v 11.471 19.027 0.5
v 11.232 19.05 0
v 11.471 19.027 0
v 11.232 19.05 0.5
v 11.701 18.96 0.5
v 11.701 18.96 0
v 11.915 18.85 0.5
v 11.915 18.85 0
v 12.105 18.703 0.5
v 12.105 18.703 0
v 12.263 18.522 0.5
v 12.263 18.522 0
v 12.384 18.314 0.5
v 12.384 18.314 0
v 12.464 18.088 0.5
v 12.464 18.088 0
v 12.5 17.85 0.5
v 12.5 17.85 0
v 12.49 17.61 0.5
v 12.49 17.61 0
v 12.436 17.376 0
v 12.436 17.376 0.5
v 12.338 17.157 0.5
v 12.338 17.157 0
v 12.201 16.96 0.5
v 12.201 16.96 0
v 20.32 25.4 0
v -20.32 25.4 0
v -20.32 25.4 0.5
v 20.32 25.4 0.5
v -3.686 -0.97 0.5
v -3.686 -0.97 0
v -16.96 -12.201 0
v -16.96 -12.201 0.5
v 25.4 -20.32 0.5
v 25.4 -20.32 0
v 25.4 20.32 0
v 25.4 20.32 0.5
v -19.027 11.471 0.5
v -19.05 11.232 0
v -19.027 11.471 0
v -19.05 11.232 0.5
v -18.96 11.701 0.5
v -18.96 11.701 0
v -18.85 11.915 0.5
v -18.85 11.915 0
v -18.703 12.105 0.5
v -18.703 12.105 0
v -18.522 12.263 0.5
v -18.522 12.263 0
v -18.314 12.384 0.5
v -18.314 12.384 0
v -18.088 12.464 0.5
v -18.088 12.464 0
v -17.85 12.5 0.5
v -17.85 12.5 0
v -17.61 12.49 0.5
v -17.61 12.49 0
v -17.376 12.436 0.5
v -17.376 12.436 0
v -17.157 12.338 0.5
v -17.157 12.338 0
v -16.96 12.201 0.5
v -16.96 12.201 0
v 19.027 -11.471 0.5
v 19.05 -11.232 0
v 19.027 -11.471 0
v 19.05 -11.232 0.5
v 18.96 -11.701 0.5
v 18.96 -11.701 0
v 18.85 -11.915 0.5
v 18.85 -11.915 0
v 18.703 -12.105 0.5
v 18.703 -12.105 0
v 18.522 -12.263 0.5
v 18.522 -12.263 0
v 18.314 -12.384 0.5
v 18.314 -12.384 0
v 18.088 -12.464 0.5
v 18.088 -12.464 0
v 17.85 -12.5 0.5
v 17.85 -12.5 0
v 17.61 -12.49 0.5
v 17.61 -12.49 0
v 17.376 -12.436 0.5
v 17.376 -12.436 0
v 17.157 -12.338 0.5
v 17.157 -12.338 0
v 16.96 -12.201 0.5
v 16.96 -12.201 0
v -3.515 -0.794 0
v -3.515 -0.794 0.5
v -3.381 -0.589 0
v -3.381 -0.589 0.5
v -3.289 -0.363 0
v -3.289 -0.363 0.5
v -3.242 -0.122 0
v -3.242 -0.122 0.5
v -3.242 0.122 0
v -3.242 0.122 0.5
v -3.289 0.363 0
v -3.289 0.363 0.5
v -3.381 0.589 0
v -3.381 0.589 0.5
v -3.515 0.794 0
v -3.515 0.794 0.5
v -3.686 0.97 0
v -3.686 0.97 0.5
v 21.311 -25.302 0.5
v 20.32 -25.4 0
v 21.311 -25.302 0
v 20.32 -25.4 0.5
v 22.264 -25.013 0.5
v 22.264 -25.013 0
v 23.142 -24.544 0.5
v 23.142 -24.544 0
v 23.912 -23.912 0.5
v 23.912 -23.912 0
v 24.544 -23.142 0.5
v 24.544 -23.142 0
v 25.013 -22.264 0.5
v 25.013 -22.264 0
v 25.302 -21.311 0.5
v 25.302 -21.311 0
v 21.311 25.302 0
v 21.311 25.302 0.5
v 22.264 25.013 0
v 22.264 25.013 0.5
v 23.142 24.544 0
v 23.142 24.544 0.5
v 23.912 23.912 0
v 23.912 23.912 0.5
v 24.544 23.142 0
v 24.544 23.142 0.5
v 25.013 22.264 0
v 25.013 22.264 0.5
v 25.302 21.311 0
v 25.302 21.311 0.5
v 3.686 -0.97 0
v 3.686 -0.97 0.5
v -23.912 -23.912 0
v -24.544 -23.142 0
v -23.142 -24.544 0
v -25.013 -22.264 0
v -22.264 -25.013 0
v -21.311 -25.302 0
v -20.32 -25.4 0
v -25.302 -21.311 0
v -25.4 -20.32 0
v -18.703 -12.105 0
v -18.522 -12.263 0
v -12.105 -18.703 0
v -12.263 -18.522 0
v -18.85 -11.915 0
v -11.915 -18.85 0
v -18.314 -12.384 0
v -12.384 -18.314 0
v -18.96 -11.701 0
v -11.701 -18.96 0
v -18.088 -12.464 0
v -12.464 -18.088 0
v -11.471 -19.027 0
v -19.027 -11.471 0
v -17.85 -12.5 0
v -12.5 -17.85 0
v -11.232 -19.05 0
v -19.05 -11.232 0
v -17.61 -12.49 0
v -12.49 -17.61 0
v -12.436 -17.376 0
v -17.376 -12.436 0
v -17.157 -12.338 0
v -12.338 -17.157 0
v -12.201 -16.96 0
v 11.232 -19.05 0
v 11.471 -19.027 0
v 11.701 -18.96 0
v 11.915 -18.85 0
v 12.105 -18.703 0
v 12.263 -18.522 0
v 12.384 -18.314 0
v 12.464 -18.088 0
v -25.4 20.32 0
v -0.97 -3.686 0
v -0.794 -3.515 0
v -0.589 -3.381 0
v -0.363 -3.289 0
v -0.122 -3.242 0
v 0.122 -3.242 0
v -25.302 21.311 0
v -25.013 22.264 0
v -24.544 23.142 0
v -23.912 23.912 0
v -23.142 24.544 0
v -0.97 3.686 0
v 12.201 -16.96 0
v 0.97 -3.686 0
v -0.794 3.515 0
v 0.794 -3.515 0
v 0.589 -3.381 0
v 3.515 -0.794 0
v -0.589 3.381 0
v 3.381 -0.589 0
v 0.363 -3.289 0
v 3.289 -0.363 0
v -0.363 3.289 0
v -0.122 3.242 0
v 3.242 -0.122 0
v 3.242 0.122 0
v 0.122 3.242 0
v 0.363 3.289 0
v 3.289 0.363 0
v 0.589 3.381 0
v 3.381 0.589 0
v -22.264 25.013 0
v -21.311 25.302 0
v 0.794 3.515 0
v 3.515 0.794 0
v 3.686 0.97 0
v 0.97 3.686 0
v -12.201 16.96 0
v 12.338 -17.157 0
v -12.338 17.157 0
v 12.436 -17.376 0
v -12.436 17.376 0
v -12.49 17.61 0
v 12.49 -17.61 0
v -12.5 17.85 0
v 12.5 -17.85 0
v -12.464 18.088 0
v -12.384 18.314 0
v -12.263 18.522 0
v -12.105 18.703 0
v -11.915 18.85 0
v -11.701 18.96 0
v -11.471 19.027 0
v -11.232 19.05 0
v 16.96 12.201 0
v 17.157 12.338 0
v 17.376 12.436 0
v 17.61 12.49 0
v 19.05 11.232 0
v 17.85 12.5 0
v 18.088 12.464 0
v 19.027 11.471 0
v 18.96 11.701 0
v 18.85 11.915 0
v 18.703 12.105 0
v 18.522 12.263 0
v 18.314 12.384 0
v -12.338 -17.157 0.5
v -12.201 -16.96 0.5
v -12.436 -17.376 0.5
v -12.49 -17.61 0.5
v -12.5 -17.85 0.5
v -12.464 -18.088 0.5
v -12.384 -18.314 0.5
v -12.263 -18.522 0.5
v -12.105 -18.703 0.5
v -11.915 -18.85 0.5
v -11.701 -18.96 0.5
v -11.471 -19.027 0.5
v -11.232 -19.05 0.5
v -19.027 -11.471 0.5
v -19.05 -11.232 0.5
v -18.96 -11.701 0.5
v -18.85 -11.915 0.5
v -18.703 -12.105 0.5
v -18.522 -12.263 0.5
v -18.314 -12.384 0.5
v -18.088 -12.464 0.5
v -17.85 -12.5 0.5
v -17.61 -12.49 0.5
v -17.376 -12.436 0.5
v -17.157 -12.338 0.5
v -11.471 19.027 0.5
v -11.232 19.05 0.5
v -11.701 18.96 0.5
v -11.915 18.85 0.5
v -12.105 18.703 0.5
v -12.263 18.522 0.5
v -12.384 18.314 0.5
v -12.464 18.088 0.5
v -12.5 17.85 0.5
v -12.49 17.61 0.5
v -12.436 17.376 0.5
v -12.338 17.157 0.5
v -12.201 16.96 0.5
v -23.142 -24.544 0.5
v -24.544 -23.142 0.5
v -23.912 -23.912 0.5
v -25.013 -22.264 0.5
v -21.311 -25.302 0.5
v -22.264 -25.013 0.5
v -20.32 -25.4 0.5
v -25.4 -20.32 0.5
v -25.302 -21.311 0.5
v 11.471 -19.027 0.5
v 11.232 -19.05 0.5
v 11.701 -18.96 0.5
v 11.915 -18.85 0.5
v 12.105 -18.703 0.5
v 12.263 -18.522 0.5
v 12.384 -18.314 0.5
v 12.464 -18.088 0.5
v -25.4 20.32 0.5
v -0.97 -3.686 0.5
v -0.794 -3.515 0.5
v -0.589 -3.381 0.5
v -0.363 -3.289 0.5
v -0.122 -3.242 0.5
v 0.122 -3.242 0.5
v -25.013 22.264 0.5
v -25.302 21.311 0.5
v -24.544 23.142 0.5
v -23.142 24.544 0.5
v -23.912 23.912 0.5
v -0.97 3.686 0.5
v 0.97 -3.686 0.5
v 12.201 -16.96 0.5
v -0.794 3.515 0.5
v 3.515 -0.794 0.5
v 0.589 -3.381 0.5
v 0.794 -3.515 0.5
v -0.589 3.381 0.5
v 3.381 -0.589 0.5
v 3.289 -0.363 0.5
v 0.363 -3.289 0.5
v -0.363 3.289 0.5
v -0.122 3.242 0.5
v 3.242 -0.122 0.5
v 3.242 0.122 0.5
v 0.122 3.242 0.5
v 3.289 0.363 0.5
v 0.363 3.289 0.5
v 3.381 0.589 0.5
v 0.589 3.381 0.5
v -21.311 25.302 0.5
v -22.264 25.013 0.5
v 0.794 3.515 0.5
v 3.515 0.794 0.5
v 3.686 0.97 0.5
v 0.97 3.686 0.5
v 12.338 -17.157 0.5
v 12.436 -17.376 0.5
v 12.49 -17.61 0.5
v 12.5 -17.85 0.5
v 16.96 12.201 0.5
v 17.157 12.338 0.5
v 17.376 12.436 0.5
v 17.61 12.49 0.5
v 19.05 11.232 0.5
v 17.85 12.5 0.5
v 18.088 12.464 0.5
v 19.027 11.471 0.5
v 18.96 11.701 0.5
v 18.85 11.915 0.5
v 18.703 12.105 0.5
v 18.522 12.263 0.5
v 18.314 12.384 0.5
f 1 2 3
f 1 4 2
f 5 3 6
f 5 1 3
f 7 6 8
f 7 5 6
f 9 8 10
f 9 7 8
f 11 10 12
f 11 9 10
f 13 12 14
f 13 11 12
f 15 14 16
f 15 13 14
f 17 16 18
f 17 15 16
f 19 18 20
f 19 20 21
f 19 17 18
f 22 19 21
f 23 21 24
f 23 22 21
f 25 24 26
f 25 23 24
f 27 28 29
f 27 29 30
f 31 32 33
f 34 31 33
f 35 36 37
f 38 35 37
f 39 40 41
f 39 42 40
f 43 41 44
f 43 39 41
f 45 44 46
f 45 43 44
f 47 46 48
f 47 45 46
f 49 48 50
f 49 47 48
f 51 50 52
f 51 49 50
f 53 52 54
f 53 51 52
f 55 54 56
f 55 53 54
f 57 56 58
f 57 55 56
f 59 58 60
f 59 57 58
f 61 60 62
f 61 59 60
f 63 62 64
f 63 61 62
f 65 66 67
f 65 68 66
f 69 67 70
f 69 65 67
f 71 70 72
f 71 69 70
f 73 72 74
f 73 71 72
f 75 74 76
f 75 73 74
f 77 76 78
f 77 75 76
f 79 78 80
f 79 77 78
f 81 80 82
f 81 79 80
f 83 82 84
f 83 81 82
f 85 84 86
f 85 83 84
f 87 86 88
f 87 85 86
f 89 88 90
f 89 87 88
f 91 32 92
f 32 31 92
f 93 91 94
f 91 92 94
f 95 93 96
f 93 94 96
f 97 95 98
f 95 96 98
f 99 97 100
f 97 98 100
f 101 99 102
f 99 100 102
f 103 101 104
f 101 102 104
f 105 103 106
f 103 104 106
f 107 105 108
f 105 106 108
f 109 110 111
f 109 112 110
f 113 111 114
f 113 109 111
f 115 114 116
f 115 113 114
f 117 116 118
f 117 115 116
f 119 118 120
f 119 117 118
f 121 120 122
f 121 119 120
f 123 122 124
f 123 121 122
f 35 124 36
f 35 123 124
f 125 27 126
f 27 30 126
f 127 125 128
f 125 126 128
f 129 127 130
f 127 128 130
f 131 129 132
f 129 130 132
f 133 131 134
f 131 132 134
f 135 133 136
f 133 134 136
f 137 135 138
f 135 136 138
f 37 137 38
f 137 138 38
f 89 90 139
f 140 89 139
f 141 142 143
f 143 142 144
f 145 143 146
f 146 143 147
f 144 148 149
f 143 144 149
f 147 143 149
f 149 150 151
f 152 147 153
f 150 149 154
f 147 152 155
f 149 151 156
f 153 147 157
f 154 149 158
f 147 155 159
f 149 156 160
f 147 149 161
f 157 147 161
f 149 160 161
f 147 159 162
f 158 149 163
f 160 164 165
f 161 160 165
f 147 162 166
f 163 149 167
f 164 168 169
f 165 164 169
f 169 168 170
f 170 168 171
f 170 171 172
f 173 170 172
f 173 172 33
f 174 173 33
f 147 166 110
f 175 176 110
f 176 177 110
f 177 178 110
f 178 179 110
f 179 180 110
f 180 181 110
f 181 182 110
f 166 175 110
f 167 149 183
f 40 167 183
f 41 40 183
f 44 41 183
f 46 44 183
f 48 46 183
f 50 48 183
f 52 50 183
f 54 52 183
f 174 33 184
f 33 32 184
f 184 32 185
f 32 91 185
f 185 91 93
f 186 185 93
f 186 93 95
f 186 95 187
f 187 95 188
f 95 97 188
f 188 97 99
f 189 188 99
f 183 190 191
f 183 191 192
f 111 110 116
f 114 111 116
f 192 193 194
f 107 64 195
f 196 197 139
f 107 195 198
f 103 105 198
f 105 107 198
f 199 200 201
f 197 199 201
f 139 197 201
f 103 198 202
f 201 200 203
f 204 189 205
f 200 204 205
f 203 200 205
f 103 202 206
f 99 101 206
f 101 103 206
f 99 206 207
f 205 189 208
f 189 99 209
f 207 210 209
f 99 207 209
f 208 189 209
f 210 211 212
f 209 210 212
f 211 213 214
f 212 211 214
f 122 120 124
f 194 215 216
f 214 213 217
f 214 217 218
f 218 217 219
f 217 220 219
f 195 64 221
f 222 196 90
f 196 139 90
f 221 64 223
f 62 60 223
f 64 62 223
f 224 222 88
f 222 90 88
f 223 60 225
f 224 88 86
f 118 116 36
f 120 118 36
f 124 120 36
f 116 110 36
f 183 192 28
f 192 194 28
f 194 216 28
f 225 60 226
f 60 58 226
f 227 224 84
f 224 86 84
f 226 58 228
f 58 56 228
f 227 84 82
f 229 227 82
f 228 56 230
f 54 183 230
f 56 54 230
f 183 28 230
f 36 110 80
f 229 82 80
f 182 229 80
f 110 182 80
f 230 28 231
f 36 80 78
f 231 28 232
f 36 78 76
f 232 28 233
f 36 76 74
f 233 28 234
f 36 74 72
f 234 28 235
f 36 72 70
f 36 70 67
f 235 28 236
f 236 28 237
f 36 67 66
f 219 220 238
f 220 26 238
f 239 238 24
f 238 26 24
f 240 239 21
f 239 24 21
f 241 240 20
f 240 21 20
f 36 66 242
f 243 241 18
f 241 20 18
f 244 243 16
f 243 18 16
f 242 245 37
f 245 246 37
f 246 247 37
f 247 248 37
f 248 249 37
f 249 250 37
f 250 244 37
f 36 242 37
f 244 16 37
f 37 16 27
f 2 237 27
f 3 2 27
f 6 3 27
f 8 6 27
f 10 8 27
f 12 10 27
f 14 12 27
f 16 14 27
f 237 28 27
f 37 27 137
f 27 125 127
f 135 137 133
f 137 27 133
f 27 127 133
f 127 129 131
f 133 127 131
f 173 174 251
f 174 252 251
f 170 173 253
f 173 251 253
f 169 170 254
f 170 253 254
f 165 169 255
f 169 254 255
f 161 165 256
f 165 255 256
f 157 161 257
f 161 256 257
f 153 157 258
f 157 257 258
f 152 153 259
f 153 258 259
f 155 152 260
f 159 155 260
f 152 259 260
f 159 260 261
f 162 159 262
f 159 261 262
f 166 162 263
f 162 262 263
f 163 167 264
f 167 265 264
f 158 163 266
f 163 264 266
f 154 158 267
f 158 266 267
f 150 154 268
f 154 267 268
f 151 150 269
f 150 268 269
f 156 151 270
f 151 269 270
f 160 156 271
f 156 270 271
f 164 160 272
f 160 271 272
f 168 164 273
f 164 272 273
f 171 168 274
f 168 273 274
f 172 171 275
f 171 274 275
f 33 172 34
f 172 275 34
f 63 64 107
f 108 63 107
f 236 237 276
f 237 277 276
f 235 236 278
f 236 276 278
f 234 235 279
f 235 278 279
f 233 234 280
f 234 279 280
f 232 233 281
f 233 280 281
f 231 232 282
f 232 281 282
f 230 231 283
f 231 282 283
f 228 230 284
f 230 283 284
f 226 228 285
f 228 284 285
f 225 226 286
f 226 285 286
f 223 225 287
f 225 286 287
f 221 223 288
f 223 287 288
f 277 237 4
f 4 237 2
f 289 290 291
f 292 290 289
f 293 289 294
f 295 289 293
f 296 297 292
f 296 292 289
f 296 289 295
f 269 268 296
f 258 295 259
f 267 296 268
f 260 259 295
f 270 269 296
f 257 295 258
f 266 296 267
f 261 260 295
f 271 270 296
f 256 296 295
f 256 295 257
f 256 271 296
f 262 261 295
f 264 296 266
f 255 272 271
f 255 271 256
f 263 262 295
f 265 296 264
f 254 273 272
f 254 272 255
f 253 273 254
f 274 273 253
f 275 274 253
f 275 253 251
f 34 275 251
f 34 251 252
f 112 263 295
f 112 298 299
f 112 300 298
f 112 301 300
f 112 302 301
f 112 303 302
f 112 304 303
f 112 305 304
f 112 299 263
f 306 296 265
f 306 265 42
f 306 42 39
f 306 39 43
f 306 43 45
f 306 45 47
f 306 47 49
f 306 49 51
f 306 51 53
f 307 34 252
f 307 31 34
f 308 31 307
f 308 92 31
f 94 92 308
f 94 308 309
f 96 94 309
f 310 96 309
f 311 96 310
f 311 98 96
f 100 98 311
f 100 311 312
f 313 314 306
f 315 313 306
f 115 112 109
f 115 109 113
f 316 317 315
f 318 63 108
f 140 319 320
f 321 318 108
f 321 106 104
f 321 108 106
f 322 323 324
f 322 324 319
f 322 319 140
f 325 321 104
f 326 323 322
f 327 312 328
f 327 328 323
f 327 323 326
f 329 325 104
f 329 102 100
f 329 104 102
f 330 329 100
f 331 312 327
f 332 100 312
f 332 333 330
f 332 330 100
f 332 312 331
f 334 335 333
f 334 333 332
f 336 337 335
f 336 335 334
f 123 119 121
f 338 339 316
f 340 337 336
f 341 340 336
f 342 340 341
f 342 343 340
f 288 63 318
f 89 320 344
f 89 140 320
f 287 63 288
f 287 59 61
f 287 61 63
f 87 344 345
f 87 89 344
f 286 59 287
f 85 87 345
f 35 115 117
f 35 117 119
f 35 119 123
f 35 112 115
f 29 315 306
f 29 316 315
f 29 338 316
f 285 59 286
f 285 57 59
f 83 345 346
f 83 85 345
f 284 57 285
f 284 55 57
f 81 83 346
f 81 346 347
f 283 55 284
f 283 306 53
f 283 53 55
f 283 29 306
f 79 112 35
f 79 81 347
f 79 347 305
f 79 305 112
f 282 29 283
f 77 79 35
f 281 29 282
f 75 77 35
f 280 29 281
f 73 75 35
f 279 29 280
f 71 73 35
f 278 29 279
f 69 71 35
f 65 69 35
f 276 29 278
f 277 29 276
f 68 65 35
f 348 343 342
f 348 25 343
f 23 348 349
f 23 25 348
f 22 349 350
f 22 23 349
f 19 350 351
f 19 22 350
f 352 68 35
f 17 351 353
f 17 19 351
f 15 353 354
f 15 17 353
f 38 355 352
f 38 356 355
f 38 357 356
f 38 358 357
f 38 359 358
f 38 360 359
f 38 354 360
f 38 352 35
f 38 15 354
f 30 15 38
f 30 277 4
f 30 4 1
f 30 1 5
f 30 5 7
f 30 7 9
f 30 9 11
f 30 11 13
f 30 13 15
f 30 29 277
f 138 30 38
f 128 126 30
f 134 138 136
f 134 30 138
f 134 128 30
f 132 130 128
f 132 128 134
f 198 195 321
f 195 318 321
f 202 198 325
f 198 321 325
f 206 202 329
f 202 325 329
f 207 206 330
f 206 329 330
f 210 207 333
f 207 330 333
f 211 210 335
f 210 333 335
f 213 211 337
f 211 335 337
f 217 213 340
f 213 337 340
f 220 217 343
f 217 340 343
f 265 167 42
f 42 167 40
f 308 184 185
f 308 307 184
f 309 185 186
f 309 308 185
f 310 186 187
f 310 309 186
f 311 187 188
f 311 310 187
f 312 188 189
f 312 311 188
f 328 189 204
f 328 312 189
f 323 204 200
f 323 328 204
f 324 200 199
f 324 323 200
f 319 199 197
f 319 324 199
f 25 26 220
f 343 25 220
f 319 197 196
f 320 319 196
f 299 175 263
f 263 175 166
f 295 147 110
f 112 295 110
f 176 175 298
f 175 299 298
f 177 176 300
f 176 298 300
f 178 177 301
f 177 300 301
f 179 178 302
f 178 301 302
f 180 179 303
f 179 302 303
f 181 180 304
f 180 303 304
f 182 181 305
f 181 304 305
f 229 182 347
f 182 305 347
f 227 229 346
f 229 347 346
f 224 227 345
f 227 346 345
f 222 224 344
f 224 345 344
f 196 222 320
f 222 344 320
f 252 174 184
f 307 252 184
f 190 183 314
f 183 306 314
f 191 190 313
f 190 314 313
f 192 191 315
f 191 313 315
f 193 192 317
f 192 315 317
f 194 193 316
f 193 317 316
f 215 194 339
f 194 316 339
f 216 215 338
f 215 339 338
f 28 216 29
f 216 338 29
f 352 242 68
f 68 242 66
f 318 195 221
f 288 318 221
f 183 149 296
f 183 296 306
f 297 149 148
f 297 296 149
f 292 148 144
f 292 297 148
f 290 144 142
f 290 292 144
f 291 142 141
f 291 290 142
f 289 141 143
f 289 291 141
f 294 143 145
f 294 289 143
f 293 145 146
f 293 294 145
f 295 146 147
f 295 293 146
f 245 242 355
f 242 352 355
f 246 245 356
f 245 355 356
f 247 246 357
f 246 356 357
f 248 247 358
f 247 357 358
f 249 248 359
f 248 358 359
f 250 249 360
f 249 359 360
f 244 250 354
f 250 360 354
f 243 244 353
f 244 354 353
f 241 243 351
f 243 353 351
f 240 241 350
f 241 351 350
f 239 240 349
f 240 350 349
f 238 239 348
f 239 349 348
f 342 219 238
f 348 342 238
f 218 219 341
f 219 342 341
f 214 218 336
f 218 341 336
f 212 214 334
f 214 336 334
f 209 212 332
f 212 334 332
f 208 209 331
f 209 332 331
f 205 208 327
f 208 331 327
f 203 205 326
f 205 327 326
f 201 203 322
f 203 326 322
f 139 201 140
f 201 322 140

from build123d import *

# Parameters (mm, degrees)
F0_W     = 50.8
F0_H     = 50.8
F1_DEPTH = 0.5
F2_R     = 1.27
F3_R     = 5.08


with BuildPart() as f1:
    # F0 (on Top) → F1 (new body)
    with BuildSketch(Plane.XY):
        Rectangle(F0_W, F0_H)
        Polygon((0, -2.54), (13.97, -19.05), (-13.97, -19.05), align=None, mode=Mode.SUBTRACT)
        Polygon((-19.05, 13.97), (-2.54, 0), (-19.05, -13.97), align=None, mode=Mode.SUBTRACT)
        Polygon((19.05, -13.97), (2.54, 0), (19.05, 13.97), align=None, mode=Mode.SUBTRACT)
        Polygon((13.97, 19.05), (0, 2.54), (-13.97, 19.05), align=None, mode=Mode.SUBTRACT)
    extrude(amount=F1_DEPTH)

    # F2
    f2_edges = [f1.edges().sort_by_distance(p)[0] for p in [
        (0, -2.54, 0.25),
        (-19.05, 13.97, 0.25),
        (-13.97, -19.05, 0.25),
        (2.54, 0, 0.25),
        (19.05, -13.97, 0.25),
        (13.97, -19.05, 0.25),
        (-2.54, 0, 0.25),
        (0, 2.54, 0.25),
        (19.05, 13.97, 0.25),
        (13.97, 19.05, 0.25),
        (-19.05, -13.97, 0.25),
        (-13.97, 19.05, 0.25),
    ]]
    fillet(f2_edges, radius=F2_R)

    # F3
    f3_edges = [f1.edges().sort_by_distance(p)[0] for p in [
        (25.4, 25.4, 0.25),
        (-25.4, 25.4, 0.25),
        (-25.4, -25.4, 0.25),
        (25.4, -25.4, 0.25),
    ]]
    fillet(f3_edges, radius=F3_R)


solid = f1.part
